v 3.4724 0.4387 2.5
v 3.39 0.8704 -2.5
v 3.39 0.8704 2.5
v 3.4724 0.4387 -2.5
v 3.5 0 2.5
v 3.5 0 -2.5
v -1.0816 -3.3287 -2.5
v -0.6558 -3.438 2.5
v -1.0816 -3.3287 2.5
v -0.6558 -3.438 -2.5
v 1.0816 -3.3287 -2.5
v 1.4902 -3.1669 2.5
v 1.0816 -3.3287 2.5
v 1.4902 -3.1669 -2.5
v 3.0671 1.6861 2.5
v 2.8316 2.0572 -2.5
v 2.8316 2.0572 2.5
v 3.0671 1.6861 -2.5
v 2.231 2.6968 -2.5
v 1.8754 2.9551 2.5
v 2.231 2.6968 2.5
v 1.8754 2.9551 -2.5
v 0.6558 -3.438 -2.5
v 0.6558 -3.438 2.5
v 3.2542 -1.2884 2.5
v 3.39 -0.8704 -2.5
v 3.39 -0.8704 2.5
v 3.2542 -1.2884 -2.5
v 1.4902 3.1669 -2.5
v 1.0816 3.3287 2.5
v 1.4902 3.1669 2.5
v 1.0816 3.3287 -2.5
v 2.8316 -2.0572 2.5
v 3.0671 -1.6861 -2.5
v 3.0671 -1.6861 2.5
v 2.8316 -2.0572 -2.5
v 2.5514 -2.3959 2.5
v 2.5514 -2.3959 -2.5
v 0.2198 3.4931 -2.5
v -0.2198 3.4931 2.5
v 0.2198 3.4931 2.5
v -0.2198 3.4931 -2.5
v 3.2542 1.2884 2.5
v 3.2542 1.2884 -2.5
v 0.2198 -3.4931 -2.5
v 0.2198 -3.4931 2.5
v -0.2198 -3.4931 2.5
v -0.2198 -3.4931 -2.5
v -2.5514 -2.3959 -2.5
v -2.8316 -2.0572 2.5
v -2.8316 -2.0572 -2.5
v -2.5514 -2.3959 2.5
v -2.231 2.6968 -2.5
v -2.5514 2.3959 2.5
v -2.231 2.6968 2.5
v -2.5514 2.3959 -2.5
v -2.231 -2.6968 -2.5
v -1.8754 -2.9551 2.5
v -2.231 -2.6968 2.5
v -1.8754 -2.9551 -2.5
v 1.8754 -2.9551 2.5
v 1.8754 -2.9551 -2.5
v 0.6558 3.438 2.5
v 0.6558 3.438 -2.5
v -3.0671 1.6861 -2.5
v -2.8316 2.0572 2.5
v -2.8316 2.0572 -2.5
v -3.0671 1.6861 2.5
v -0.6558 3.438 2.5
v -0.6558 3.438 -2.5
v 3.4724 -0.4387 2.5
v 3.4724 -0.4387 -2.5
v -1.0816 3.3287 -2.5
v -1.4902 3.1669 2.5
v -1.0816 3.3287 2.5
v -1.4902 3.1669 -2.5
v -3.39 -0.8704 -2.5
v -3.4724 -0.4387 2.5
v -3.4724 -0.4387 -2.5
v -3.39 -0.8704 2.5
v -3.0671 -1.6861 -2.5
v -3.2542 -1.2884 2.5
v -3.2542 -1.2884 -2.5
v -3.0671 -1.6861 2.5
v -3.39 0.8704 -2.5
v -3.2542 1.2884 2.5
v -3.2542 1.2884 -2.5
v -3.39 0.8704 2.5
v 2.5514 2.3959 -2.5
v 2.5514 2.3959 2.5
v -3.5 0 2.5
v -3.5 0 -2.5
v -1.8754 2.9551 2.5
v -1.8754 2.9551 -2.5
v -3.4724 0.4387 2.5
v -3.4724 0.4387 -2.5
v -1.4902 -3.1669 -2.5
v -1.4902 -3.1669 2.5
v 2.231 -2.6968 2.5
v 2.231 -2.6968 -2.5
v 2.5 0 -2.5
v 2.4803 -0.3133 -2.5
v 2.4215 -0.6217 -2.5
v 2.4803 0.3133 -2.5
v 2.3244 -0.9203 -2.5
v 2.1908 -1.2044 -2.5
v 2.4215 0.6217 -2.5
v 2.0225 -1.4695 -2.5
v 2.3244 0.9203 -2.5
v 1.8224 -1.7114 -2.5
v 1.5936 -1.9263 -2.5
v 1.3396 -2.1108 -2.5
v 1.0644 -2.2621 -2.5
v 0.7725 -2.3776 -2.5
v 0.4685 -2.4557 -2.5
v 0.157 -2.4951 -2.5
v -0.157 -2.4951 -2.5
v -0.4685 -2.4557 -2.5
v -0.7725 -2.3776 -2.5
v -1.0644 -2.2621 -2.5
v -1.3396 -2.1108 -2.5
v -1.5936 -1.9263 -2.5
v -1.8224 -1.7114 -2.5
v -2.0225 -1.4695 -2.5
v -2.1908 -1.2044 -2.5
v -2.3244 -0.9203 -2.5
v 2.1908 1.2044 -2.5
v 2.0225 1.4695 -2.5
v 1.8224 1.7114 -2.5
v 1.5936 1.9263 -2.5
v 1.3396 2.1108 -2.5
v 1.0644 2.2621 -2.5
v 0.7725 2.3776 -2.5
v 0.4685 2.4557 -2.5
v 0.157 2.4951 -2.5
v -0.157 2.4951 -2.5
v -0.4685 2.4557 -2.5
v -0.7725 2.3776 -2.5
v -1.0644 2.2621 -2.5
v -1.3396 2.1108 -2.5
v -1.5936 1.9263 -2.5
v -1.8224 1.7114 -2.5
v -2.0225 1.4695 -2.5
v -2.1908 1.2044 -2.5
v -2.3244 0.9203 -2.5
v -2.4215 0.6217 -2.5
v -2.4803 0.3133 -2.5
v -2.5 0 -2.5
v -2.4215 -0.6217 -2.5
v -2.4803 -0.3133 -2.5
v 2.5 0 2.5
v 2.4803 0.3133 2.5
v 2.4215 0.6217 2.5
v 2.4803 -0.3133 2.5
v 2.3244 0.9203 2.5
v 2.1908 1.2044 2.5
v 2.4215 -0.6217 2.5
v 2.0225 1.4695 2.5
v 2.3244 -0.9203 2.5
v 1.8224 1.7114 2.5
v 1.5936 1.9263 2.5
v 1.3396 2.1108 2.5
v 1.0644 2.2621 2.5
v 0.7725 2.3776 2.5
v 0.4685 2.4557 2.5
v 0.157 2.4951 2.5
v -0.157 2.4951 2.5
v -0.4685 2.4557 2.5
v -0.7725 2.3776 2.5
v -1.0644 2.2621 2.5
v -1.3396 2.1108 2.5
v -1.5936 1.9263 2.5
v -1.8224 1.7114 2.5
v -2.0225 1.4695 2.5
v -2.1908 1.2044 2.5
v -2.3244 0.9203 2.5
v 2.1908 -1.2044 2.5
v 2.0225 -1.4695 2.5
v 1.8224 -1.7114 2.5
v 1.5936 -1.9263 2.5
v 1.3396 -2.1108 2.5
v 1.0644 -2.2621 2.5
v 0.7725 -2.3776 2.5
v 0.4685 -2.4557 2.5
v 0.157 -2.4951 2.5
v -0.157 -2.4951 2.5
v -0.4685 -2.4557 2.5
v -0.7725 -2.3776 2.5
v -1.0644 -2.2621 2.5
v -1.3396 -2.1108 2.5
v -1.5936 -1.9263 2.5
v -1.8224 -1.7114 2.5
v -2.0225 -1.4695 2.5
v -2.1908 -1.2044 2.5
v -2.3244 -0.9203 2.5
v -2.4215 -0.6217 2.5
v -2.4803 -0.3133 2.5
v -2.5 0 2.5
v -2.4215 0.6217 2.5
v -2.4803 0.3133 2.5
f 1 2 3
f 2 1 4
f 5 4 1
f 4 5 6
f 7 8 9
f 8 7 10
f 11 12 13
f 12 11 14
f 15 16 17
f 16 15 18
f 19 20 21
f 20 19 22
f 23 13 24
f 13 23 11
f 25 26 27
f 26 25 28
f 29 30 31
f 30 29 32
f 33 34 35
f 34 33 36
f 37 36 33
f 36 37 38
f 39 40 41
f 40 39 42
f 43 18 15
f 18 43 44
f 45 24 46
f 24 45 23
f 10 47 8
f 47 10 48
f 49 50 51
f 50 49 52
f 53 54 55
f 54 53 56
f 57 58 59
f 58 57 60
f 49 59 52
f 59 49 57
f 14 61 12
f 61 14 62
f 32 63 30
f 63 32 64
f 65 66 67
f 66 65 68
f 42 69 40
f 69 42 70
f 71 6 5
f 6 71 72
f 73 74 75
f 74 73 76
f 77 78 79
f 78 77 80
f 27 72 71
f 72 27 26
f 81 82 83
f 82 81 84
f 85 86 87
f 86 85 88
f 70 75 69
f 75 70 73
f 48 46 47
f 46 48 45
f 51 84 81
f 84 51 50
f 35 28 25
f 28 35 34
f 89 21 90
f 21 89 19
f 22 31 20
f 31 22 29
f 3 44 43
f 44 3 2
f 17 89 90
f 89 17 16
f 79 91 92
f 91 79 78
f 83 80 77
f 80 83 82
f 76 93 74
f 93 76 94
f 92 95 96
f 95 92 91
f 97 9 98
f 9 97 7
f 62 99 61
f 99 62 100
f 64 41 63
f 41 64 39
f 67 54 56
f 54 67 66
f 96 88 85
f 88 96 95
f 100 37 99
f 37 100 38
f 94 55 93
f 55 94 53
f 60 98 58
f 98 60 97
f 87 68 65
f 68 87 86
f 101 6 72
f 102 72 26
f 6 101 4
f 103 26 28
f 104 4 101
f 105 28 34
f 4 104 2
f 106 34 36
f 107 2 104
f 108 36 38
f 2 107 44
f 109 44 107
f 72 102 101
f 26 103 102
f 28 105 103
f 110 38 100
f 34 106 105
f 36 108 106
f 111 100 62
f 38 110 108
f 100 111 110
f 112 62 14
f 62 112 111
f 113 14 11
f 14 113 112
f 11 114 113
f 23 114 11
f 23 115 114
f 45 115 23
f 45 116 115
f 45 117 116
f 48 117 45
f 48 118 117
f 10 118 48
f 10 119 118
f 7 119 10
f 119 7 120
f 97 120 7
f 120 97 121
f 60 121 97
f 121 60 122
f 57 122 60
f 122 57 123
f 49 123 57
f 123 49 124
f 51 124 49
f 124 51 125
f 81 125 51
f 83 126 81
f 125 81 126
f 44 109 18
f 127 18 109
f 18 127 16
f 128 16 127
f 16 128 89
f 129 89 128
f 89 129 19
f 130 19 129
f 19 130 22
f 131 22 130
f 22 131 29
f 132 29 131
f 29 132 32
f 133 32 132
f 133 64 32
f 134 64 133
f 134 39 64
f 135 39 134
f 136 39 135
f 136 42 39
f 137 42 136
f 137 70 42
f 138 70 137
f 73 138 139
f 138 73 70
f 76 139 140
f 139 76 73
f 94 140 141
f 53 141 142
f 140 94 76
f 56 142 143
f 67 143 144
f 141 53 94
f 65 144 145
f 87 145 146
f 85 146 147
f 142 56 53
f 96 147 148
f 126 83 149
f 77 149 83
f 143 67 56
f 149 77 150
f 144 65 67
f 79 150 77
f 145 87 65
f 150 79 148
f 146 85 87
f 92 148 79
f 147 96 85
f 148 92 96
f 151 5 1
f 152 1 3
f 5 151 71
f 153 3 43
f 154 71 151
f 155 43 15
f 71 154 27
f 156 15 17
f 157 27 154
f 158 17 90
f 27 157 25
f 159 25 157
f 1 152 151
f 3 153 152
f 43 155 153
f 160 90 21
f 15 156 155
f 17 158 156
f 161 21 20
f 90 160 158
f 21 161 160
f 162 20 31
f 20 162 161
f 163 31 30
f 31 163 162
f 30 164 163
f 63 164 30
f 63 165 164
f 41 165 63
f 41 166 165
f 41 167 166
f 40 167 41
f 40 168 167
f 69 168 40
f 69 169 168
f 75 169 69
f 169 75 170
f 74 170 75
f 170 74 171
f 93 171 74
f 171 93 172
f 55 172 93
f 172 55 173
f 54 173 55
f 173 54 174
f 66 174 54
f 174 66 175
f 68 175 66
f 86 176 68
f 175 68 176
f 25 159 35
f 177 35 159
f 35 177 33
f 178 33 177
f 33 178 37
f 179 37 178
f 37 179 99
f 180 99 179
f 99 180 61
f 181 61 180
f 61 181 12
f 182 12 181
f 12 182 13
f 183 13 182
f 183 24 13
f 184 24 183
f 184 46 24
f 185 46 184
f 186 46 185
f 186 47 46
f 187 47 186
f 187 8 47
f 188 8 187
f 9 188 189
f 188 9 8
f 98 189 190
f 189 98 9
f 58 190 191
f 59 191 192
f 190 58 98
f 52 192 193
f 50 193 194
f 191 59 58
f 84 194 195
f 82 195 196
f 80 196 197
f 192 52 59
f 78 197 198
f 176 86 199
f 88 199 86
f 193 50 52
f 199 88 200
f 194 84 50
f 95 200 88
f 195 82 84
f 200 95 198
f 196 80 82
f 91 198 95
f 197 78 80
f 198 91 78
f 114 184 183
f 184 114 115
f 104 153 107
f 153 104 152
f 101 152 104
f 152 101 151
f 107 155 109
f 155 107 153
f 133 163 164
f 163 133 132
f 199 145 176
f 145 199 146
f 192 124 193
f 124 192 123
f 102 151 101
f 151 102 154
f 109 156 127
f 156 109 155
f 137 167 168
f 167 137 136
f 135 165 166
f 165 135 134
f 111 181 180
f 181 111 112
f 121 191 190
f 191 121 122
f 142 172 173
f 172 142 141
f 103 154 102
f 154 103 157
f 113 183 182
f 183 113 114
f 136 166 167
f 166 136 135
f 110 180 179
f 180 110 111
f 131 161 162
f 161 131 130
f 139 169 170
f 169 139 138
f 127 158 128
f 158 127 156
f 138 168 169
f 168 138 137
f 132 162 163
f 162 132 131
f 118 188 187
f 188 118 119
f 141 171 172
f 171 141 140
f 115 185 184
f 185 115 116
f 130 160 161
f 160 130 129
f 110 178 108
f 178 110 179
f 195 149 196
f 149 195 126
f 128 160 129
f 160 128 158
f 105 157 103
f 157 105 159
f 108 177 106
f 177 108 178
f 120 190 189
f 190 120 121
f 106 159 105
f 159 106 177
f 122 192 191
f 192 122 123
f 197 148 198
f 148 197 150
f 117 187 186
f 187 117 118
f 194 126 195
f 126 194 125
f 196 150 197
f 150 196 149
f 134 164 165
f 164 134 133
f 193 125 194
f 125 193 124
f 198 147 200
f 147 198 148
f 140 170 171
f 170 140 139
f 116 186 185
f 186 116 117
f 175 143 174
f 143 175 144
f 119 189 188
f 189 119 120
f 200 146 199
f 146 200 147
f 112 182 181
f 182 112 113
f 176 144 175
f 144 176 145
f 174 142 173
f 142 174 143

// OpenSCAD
$fn = 50;


difference() {
	union() {
		translate(v = [0, 0, -2.5000000000]) {
			cylinder(h = 5, r = 3.5000000000);
		}
	}
	union() {
		translate(v = [0, 0, -100.0000000000]) {
			cylinder(h = 200, r = 2.5000000000);
		}
	}
}
